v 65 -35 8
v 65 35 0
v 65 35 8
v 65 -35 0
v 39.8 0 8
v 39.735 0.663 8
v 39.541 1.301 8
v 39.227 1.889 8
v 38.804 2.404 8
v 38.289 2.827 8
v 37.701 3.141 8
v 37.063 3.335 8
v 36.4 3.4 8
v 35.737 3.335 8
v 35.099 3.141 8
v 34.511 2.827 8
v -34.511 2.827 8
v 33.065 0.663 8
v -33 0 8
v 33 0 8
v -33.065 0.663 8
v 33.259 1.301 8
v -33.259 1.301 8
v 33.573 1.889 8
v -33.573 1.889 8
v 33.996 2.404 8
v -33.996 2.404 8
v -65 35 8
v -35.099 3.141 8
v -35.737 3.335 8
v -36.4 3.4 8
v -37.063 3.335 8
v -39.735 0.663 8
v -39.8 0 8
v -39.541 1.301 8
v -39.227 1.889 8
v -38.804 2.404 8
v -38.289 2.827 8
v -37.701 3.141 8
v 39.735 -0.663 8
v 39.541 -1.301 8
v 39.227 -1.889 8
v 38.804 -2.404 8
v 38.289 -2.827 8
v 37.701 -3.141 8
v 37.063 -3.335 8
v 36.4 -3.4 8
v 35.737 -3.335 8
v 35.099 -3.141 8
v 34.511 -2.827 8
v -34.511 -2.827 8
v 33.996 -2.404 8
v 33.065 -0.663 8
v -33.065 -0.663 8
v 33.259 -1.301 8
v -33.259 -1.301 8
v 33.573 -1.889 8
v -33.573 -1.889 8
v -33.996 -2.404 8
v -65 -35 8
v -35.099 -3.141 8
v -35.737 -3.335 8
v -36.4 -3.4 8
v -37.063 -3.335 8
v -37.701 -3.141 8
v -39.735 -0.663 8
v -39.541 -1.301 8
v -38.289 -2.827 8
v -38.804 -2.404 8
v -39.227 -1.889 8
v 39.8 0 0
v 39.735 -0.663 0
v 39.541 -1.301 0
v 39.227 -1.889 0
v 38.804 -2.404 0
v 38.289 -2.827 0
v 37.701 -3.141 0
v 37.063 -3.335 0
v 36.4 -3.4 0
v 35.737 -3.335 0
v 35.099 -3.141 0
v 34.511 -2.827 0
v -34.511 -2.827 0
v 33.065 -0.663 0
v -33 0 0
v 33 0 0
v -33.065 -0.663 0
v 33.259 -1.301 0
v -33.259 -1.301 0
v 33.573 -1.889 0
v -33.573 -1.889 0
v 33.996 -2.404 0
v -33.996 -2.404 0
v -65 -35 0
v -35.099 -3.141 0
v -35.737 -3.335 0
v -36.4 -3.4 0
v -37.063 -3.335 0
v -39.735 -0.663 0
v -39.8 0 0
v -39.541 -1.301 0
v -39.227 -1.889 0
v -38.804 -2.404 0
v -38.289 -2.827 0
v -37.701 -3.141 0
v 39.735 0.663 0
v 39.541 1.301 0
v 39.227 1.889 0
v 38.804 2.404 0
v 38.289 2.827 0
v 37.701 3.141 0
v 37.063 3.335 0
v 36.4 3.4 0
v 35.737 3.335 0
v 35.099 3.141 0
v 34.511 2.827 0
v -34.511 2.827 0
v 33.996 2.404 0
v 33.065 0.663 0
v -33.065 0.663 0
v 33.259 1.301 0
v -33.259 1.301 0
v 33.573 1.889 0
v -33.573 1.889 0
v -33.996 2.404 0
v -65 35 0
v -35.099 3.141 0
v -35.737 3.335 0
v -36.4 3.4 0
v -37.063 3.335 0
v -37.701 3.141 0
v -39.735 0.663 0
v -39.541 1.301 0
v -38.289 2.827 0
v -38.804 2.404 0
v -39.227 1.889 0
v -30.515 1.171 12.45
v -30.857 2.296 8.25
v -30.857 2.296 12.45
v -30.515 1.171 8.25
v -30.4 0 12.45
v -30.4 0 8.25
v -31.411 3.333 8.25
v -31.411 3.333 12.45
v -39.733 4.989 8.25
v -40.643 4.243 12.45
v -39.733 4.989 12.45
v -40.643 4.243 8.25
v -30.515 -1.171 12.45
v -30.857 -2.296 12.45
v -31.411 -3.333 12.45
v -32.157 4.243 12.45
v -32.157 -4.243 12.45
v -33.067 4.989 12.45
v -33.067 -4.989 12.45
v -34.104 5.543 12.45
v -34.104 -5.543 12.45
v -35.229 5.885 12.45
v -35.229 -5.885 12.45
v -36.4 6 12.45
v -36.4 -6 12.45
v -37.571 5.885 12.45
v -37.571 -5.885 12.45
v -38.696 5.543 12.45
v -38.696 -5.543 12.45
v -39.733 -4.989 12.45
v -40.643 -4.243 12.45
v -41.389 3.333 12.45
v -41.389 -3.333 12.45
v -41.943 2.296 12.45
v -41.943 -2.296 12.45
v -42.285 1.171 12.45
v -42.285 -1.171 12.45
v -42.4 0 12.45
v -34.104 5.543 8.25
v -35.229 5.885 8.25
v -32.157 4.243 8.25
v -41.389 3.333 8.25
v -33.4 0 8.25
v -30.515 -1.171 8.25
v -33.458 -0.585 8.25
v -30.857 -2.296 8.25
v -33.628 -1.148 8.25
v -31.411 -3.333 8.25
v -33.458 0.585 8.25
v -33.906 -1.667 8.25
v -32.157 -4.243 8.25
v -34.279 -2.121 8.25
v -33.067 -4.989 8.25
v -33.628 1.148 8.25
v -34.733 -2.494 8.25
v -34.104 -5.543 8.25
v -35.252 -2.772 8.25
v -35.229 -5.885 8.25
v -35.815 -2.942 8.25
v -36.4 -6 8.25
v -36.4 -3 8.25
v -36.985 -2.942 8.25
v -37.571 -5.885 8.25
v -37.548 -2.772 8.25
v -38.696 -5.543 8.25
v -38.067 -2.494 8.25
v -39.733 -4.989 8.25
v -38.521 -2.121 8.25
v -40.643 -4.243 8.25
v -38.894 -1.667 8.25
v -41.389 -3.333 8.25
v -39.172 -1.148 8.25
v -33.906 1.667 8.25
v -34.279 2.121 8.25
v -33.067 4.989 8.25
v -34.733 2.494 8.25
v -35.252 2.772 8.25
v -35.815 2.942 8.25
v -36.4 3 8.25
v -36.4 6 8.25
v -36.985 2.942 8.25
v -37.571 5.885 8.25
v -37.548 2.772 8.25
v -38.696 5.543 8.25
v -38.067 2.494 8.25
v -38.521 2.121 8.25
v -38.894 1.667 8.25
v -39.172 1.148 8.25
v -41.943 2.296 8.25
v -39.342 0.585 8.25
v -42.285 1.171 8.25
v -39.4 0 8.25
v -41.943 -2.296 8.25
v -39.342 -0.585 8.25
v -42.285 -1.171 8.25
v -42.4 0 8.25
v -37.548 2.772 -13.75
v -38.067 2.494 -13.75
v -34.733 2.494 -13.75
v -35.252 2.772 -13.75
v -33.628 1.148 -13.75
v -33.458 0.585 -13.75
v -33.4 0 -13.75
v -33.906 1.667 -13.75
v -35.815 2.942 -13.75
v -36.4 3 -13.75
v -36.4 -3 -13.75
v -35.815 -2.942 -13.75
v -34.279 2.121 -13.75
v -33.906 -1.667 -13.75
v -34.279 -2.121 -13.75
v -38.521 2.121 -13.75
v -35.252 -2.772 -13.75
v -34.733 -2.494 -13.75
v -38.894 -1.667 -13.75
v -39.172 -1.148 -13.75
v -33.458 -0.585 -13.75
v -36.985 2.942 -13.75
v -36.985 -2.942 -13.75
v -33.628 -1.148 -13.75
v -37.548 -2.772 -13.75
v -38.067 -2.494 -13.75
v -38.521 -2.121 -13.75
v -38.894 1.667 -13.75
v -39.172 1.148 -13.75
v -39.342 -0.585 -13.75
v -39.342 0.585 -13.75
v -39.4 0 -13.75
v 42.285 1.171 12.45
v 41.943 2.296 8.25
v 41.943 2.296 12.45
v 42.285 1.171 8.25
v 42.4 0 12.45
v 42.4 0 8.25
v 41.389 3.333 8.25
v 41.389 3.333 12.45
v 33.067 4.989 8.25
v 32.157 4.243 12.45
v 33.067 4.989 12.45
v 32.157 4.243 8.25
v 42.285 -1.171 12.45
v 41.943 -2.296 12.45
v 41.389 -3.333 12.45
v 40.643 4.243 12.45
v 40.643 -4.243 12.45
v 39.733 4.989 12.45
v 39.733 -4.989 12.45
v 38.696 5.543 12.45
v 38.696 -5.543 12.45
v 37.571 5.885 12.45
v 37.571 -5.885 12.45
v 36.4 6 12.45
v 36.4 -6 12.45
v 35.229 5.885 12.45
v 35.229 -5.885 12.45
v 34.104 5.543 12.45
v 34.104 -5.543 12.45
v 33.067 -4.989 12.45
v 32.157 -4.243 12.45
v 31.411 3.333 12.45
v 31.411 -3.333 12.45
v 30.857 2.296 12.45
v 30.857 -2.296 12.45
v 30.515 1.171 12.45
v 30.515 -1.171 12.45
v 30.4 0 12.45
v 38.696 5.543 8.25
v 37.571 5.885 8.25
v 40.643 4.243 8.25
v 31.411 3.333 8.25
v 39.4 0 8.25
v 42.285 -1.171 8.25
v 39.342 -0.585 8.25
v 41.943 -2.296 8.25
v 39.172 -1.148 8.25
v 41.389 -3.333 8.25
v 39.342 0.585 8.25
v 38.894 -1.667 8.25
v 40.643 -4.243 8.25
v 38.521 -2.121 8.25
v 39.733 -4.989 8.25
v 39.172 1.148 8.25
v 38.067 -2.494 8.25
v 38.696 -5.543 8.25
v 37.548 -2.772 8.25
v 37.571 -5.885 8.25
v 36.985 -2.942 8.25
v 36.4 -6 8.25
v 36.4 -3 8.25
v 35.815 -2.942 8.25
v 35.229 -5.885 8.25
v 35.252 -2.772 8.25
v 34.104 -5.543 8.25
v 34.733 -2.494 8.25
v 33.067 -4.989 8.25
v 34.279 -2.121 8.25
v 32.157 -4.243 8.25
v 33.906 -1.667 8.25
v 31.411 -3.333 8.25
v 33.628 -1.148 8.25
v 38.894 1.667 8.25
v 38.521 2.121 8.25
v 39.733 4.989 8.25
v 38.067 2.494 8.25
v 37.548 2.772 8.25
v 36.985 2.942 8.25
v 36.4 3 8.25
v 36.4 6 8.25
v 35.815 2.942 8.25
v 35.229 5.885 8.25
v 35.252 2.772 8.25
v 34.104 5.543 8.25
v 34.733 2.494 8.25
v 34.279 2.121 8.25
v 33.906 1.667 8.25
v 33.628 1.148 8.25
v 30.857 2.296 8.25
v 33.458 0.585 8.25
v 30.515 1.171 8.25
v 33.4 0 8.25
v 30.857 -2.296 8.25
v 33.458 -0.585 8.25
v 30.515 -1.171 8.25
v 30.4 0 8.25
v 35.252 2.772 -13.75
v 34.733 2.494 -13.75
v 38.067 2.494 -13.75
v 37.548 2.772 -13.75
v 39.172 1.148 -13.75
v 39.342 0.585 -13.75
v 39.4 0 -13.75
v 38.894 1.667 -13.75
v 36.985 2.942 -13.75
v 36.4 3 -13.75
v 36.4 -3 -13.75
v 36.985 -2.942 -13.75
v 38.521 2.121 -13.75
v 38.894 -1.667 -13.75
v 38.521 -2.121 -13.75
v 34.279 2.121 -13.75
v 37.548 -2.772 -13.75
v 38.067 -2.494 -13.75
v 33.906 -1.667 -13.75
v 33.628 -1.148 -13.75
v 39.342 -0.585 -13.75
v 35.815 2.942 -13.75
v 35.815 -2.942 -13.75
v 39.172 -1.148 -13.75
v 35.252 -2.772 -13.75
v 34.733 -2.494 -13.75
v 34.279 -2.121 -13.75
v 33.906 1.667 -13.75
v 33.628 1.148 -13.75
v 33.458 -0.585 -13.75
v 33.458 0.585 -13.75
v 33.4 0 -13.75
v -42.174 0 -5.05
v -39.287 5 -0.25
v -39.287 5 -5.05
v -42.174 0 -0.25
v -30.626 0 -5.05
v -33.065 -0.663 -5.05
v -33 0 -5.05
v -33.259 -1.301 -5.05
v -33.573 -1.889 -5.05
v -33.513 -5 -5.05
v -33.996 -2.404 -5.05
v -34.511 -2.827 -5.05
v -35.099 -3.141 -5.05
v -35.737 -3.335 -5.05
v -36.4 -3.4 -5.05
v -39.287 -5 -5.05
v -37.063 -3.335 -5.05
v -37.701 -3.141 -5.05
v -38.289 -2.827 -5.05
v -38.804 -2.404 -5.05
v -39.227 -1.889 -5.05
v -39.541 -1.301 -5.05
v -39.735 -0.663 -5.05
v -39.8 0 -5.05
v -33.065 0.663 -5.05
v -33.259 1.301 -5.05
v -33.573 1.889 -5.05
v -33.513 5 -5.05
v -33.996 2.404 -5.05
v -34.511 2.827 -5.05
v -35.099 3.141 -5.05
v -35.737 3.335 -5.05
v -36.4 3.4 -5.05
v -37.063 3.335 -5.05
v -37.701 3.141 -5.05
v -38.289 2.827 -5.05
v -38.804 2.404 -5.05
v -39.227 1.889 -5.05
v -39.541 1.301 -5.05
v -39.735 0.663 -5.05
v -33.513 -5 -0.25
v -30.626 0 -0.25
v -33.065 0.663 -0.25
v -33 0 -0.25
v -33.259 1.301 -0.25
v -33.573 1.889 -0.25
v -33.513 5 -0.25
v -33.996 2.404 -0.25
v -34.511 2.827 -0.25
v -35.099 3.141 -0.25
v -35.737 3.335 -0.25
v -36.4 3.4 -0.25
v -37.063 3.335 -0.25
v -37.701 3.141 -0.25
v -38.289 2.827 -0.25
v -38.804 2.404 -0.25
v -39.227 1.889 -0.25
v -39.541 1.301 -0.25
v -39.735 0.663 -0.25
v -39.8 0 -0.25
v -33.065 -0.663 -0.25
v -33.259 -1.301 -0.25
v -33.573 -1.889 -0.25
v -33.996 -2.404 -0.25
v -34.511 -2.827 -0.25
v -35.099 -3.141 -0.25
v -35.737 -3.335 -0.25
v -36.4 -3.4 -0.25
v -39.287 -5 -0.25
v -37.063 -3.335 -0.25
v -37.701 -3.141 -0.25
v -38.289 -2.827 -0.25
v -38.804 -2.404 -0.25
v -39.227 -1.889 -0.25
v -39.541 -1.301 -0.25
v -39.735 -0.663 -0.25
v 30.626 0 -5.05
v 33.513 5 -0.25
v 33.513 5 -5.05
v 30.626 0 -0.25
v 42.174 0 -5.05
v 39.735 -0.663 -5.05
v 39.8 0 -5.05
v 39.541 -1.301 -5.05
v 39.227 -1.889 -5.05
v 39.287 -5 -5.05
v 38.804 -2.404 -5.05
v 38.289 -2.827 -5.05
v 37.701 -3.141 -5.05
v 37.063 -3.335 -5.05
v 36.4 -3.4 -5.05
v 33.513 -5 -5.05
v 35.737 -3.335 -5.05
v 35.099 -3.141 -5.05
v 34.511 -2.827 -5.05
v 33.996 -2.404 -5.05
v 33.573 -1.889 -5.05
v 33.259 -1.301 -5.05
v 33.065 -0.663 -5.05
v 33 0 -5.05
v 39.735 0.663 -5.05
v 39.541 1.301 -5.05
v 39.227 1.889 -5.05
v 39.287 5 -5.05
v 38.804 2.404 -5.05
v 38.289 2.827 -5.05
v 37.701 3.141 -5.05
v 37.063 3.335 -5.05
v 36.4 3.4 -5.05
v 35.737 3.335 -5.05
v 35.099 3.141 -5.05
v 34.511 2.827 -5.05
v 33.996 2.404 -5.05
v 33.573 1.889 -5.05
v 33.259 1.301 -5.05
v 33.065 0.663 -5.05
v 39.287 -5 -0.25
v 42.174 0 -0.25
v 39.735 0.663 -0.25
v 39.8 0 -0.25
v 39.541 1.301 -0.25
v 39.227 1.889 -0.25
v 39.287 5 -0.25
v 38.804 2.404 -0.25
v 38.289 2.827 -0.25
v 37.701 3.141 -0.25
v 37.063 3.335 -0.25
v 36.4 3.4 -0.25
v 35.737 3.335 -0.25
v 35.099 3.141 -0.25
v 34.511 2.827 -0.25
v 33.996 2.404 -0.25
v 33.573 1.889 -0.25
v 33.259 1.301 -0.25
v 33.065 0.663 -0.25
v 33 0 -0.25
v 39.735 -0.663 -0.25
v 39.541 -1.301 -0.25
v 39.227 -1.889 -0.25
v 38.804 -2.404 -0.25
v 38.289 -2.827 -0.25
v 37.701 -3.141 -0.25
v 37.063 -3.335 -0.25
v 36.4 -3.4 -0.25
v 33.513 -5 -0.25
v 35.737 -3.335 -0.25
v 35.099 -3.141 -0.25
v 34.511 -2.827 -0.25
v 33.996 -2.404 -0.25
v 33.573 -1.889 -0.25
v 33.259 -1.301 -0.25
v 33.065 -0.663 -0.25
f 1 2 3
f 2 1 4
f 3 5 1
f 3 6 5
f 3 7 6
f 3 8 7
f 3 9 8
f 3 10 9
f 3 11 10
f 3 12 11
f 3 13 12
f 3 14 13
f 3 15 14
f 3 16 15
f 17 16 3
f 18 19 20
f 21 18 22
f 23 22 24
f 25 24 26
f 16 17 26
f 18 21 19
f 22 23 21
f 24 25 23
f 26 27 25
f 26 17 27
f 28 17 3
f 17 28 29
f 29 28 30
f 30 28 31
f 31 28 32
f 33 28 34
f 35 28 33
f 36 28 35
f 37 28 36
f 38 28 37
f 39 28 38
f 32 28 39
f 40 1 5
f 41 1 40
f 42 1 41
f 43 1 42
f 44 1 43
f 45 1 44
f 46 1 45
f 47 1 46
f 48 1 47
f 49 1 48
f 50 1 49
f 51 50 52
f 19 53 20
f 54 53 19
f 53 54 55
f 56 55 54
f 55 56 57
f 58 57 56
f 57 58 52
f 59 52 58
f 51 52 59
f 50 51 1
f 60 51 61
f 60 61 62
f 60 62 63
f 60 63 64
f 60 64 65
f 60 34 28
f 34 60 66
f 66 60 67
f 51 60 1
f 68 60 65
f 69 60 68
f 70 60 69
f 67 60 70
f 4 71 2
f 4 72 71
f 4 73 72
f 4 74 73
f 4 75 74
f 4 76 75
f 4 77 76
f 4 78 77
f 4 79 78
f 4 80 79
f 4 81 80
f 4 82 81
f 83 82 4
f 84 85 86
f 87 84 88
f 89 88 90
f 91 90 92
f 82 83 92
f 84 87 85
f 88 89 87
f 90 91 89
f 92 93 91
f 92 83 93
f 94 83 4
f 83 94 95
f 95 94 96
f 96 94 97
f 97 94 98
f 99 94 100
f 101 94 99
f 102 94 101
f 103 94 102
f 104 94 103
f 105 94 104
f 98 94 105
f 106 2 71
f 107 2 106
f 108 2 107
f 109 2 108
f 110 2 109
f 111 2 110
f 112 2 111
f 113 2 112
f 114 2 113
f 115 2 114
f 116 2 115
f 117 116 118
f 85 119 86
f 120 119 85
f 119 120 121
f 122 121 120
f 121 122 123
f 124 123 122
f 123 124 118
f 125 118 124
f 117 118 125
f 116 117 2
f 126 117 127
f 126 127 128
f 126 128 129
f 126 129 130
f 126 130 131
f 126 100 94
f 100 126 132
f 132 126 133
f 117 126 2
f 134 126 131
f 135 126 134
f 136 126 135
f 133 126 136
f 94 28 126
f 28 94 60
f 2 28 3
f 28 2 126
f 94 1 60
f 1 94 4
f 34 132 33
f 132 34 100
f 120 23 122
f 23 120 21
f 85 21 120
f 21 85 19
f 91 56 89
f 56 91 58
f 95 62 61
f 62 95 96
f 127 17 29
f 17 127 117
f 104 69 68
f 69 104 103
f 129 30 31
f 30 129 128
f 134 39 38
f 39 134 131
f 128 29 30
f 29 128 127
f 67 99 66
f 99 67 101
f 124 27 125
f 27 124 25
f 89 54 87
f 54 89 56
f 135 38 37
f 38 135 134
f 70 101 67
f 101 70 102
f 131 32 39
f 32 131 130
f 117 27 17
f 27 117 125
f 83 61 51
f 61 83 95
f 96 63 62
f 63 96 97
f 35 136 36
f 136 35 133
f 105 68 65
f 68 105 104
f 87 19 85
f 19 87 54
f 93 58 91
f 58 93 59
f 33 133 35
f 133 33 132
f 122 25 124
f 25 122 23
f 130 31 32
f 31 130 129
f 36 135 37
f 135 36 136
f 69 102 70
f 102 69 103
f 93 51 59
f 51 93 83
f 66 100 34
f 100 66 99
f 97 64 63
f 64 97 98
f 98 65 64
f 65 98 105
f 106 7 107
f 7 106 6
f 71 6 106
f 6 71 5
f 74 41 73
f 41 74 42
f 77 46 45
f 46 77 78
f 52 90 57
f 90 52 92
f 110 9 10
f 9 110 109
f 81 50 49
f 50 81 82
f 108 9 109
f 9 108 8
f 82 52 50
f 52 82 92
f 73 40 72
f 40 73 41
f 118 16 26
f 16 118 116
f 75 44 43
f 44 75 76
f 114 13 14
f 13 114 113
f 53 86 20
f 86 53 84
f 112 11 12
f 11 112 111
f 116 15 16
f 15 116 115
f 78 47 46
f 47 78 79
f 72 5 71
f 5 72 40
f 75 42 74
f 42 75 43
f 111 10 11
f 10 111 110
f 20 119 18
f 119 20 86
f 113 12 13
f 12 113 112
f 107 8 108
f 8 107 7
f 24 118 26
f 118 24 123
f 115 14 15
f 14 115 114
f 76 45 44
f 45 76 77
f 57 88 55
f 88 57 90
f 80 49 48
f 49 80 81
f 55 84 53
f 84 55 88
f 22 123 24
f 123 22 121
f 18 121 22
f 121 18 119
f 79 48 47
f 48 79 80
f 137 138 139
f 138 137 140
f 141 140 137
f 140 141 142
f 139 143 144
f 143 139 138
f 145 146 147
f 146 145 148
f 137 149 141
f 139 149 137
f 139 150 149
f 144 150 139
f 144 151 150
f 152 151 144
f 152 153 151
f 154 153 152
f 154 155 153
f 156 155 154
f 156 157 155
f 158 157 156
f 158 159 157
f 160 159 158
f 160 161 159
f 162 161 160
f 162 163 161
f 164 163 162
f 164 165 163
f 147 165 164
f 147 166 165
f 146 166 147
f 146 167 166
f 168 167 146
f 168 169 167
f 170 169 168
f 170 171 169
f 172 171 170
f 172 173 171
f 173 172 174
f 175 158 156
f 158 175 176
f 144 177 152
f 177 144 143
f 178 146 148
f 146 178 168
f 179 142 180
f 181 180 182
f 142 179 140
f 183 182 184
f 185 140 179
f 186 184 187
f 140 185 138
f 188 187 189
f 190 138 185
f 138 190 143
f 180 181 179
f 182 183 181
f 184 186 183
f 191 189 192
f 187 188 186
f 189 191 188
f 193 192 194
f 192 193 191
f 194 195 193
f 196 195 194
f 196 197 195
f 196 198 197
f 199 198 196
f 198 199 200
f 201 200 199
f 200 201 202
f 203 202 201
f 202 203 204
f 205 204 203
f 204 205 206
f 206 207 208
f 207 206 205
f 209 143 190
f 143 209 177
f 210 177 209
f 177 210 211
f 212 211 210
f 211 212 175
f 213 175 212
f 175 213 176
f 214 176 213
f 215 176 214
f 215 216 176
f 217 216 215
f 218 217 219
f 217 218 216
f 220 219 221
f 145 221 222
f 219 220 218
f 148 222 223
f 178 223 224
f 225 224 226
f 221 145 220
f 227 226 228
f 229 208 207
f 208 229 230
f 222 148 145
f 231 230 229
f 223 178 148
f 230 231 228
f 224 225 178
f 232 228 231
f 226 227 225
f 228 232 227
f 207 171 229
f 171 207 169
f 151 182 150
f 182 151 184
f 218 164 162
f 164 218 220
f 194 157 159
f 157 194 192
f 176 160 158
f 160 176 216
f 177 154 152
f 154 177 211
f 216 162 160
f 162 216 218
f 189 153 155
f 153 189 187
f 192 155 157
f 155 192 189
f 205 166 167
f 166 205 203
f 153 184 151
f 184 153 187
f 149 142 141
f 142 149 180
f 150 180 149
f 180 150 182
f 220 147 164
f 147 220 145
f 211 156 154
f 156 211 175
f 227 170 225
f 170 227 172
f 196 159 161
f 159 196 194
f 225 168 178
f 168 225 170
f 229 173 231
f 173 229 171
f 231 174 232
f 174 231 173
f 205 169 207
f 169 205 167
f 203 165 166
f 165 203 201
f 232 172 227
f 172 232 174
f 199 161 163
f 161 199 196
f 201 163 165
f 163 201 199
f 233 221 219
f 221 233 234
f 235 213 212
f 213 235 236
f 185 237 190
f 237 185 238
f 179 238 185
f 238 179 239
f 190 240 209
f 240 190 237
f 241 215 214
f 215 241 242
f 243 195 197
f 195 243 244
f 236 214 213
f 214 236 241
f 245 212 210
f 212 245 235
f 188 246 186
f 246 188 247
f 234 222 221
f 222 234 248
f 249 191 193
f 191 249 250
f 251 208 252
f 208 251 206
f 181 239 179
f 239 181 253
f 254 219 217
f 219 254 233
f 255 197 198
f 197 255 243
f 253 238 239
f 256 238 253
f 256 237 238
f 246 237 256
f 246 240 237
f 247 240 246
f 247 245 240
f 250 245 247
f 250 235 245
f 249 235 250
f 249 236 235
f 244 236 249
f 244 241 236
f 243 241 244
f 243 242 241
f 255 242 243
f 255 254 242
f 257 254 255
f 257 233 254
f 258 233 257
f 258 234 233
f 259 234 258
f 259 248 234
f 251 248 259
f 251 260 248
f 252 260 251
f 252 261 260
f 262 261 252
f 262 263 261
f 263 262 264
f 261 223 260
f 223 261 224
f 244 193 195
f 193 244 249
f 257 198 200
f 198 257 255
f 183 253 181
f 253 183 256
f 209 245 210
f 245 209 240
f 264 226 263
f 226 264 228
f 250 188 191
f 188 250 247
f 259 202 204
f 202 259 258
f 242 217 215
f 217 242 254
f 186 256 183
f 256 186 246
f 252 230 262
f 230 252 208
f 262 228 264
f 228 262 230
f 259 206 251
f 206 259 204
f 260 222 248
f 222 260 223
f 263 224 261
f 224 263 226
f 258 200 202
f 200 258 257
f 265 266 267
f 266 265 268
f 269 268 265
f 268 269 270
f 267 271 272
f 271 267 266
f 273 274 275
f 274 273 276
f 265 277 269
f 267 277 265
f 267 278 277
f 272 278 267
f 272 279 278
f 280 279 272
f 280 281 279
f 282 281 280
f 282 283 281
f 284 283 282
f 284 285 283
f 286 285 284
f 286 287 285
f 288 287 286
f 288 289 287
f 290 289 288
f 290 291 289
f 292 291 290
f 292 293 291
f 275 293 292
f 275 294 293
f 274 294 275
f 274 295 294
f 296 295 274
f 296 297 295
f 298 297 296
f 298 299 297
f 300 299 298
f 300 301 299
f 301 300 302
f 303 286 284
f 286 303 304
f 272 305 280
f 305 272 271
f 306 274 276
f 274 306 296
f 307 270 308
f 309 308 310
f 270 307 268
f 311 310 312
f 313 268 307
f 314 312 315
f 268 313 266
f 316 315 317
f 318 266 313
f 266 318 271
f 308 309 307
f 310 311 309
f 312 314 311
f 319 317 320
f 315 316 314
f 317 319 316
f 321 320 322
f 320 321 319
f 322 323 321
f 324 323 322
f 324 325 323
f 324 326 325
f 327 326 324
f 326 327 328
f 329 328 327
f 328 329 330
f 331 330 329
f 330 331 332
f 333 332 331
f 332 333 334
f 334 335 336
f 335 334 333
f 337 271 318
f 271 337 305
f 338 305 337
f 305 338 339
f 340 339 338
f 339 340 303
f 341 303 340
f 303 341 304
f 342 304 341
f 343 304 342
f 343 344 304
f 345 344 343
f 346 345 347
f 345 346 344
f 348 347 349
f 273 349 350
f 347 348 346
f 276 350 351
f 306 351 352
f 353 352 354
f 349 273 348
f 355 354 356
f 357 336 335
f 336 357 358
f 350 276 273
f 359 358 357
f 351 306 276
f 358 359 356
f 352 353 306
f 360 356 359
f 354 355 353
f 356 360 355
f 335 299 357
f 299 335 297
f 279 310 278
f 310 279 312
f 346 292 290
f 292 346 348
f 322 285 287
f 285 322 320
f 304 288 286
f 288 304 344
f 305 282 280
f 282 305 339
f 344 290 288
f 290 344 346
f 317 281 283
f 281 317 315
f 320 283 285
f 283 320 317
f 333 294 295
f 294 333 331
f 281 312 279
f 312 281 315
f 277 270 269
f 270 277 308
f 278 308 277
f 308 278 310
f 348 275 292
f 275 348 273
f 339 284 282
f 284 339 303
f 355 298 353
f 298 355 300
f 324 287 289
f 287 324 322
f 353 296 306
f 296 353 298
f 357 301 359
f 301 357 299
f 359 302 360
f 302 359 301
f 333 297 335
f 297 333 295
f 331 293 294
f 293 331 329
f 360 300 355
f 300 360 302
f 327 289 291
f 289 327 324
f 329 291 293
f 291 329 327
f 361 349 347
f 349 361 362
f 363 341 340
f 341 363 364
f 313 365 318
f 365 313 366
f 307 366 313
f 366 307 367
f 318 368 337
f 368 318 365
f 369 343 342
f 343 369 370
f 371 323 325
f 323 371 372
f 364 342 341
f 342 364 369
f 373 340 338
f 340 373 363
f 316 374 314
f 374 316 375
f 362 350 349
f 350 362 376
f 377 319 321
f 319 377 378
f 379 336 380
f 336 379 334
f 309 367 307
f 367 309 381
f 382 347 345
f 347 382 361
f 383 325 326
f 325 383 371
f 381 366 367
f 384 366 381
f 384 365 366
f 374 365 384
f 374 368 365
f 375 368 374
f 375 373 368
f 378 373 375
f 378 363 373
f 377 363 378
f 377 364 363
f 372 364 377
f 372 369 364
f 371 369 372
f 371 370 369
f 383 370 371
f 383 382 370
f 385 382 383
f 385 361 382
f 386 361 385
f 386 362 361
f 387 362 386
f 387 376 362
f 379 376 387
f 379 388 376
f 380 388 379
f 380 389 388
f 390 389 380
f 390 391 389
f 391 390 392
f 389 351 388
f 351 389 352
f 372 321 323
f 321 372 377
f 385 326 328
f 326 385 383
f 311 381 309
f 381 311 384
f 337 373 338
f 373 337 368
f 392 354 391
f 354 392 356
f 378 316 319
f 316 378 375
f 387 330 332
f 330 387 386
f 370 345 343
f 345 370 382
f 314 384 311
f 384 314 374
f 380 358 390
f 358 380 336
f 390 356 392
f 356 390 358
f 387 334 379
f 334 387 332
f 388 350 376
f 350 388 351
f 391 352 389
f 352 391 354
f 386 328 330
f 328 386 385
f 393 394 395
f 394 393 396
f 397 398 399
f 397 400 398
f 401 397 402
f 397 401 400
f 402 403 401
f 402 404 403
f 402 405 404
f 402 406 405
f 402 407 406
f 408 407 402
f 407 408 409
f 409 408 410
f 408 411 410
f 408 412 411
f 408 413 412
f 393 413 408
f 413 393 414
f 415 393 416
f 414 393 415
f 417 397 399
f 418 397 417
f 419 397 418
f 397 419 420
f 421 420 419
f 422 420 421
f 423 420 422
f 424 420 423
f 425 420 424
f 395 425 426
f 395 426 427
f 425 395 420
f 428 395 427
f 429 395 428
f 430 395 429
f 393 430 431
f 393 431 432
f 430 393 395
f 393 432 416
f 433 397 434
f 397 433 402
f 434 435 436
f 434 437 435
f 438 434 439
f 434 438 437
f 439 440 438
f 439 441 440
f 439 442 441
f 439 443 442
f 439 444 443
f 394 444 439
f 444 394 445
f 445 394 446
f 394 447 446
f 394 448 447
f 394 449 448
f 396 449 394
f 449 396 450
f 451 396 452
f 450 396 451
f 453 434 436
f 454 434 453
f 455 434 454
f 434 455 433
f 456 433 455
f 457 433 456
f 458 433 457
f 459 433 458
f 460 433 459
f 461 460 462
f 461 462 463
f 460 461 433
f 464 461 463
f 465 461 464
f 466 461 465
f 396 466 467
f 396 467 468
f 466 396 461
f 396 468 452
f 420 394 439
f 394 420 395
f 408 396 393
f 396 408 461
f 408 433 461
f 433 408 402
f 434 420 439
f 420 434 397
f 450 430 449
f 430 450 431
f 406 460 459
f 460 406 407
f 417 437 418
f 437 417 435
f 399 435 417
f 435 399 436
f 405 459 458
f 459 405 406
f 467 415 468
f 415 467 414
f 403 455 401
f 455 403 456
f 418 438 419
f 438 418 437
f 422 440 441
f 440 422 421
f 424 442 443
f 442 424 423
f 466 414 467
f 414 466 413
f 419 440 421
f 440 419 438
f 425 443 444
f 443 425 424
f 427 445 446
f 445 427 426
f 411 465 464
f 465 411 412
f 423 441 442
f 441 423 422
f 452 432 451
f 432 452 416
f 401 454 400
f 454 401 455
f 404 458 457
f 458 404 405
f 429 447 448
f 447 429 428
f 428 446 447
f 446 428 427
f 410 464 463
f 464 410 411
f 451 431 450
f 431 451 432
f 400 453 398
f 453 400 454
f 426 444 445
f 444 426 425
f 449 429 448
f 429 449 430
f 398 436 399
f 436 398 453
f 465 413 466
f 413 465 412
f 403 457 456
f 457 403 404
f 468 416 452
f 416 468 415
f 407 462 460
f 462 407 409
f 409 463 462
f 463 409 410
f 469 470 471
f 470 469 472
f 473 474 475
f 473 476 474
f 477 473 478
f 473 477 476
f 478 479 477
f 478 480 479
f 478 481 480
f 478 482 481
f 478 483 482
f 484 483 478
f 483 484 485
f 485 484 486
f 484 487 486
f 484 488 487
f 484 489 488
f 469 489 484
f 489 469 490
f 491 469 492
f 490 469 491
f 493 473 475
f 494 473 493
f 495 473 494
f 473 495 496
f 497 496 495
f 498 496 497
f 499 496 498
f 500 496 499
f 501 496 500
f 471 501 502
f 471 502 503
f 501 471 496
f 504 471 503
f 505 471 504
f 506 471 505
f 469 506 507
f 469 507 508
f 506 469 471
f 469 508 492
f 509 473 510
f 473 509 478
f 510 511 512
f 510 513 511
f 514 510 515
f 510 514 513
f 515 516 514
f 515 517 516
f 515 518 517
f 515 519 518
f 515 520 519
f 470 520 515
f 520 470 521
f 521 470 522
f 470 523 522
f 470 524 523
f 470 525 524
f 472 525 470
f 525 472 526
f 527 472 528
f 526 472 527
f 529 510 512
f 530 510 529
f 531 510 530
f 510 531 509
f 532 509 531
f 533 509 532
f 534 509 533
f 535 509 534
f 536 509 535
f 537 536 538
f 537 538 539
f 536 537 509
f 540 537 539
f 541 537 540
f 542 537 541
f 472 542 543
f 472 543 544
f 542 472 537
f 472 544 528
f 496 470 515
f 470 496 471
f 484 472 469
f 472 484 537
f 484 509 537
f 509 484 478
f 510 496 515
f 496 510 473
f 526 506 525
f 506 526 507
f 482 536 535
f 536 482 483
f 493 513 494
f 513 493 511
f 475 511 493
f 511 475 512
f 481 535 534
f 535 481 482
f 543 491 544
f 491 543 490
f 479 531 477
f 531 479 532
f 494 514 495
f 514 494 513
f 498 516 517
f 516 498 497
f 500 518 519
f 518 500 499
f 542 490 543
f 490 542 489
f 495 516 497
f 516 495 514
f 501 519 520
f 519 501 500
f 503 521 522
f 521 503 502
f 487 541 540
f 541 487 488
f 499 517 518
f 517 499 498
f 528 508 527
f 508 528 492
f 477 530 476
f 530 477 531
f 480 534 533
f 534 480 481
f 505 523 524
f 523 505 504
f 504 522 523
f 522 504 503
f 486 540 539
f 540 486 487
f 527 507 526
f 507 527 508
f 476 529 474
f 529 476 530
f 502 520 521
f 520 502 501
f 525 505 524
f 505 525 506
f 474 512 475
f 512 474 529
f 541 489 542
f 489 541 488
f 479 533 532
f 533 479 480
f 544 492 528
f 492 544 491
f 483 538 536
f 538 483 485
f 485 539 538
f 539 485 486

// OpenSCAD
$fn = 32;

// ------------------------------------------------------------------------
// Bolted plate: 130 x 70 x 8 mm plate, 2 fasteners
// Every part is its own module, assembly() places them once.
// ------------------------------------------------------------------------

// --- part 1 ---
module plate() {
  difference() {
    translate([-65, -35, 0]) cube([130, 70, 8]);
    translate([-36.4, 0, -1]) cylinder(h = 10, d = 6.8);
    translate([36.4, 0, -1]) cylinder(h = 10, d = 6.8);
  }
}

// --- part 2 ---
module bolt1() {
  cylinder(h = 4.2, d = 12);
  translate([0, 0, -22]) cylinder(h = 22, d = 6);
}

// --- part 3 ---
module bolt2() {
  cylinder(h = 4.2, d = 12);
  translate([0, 0, -22]) cylinder(h = 22, d = 6);
}

// --- part 4 ---
module nut1() {
  difference() {
    linear_extrude(height = 4.8) polygon(points = [[5.774, 0], [2.887, 5], [-2.887, 5], [-5.774, 0], [-2.887, -5], [2.887, -5]]);
    translate([0, 0, -1]) cylinder(h = 6.8, d = 6.8);
  }
}

// --- part 5 ---
module nut2() {
  difference() {
    linear_extrude(height = 4.8) polygon(points = [[5.774, 0], [2.887, 5], [-2.887, 5], [-5.774, 0], [-2.887, -5], [2.887, -5]]);
    translate([0, 0, -1]) cylinder(h = 6.8, d = 6.8);
  }
}

// --- assembly ---
module assembly() {
  translate([0, 0, 0]) rotate([0, 0, 0]) plate();
  translate([-36.4, 0, 8.25]) rotate([0, 0, 0]) bolt1();
  translate([36.4, 0, 8.25]) rotate([0, 0, 0]) bolt2();
  translate([-36.4, 0, -5.05]) rotate([0, 0, 0]) nut1();
  translate([36.4, 0, -5.05]) rotate([0, 0, 0]) nut2();
}

assembly();
